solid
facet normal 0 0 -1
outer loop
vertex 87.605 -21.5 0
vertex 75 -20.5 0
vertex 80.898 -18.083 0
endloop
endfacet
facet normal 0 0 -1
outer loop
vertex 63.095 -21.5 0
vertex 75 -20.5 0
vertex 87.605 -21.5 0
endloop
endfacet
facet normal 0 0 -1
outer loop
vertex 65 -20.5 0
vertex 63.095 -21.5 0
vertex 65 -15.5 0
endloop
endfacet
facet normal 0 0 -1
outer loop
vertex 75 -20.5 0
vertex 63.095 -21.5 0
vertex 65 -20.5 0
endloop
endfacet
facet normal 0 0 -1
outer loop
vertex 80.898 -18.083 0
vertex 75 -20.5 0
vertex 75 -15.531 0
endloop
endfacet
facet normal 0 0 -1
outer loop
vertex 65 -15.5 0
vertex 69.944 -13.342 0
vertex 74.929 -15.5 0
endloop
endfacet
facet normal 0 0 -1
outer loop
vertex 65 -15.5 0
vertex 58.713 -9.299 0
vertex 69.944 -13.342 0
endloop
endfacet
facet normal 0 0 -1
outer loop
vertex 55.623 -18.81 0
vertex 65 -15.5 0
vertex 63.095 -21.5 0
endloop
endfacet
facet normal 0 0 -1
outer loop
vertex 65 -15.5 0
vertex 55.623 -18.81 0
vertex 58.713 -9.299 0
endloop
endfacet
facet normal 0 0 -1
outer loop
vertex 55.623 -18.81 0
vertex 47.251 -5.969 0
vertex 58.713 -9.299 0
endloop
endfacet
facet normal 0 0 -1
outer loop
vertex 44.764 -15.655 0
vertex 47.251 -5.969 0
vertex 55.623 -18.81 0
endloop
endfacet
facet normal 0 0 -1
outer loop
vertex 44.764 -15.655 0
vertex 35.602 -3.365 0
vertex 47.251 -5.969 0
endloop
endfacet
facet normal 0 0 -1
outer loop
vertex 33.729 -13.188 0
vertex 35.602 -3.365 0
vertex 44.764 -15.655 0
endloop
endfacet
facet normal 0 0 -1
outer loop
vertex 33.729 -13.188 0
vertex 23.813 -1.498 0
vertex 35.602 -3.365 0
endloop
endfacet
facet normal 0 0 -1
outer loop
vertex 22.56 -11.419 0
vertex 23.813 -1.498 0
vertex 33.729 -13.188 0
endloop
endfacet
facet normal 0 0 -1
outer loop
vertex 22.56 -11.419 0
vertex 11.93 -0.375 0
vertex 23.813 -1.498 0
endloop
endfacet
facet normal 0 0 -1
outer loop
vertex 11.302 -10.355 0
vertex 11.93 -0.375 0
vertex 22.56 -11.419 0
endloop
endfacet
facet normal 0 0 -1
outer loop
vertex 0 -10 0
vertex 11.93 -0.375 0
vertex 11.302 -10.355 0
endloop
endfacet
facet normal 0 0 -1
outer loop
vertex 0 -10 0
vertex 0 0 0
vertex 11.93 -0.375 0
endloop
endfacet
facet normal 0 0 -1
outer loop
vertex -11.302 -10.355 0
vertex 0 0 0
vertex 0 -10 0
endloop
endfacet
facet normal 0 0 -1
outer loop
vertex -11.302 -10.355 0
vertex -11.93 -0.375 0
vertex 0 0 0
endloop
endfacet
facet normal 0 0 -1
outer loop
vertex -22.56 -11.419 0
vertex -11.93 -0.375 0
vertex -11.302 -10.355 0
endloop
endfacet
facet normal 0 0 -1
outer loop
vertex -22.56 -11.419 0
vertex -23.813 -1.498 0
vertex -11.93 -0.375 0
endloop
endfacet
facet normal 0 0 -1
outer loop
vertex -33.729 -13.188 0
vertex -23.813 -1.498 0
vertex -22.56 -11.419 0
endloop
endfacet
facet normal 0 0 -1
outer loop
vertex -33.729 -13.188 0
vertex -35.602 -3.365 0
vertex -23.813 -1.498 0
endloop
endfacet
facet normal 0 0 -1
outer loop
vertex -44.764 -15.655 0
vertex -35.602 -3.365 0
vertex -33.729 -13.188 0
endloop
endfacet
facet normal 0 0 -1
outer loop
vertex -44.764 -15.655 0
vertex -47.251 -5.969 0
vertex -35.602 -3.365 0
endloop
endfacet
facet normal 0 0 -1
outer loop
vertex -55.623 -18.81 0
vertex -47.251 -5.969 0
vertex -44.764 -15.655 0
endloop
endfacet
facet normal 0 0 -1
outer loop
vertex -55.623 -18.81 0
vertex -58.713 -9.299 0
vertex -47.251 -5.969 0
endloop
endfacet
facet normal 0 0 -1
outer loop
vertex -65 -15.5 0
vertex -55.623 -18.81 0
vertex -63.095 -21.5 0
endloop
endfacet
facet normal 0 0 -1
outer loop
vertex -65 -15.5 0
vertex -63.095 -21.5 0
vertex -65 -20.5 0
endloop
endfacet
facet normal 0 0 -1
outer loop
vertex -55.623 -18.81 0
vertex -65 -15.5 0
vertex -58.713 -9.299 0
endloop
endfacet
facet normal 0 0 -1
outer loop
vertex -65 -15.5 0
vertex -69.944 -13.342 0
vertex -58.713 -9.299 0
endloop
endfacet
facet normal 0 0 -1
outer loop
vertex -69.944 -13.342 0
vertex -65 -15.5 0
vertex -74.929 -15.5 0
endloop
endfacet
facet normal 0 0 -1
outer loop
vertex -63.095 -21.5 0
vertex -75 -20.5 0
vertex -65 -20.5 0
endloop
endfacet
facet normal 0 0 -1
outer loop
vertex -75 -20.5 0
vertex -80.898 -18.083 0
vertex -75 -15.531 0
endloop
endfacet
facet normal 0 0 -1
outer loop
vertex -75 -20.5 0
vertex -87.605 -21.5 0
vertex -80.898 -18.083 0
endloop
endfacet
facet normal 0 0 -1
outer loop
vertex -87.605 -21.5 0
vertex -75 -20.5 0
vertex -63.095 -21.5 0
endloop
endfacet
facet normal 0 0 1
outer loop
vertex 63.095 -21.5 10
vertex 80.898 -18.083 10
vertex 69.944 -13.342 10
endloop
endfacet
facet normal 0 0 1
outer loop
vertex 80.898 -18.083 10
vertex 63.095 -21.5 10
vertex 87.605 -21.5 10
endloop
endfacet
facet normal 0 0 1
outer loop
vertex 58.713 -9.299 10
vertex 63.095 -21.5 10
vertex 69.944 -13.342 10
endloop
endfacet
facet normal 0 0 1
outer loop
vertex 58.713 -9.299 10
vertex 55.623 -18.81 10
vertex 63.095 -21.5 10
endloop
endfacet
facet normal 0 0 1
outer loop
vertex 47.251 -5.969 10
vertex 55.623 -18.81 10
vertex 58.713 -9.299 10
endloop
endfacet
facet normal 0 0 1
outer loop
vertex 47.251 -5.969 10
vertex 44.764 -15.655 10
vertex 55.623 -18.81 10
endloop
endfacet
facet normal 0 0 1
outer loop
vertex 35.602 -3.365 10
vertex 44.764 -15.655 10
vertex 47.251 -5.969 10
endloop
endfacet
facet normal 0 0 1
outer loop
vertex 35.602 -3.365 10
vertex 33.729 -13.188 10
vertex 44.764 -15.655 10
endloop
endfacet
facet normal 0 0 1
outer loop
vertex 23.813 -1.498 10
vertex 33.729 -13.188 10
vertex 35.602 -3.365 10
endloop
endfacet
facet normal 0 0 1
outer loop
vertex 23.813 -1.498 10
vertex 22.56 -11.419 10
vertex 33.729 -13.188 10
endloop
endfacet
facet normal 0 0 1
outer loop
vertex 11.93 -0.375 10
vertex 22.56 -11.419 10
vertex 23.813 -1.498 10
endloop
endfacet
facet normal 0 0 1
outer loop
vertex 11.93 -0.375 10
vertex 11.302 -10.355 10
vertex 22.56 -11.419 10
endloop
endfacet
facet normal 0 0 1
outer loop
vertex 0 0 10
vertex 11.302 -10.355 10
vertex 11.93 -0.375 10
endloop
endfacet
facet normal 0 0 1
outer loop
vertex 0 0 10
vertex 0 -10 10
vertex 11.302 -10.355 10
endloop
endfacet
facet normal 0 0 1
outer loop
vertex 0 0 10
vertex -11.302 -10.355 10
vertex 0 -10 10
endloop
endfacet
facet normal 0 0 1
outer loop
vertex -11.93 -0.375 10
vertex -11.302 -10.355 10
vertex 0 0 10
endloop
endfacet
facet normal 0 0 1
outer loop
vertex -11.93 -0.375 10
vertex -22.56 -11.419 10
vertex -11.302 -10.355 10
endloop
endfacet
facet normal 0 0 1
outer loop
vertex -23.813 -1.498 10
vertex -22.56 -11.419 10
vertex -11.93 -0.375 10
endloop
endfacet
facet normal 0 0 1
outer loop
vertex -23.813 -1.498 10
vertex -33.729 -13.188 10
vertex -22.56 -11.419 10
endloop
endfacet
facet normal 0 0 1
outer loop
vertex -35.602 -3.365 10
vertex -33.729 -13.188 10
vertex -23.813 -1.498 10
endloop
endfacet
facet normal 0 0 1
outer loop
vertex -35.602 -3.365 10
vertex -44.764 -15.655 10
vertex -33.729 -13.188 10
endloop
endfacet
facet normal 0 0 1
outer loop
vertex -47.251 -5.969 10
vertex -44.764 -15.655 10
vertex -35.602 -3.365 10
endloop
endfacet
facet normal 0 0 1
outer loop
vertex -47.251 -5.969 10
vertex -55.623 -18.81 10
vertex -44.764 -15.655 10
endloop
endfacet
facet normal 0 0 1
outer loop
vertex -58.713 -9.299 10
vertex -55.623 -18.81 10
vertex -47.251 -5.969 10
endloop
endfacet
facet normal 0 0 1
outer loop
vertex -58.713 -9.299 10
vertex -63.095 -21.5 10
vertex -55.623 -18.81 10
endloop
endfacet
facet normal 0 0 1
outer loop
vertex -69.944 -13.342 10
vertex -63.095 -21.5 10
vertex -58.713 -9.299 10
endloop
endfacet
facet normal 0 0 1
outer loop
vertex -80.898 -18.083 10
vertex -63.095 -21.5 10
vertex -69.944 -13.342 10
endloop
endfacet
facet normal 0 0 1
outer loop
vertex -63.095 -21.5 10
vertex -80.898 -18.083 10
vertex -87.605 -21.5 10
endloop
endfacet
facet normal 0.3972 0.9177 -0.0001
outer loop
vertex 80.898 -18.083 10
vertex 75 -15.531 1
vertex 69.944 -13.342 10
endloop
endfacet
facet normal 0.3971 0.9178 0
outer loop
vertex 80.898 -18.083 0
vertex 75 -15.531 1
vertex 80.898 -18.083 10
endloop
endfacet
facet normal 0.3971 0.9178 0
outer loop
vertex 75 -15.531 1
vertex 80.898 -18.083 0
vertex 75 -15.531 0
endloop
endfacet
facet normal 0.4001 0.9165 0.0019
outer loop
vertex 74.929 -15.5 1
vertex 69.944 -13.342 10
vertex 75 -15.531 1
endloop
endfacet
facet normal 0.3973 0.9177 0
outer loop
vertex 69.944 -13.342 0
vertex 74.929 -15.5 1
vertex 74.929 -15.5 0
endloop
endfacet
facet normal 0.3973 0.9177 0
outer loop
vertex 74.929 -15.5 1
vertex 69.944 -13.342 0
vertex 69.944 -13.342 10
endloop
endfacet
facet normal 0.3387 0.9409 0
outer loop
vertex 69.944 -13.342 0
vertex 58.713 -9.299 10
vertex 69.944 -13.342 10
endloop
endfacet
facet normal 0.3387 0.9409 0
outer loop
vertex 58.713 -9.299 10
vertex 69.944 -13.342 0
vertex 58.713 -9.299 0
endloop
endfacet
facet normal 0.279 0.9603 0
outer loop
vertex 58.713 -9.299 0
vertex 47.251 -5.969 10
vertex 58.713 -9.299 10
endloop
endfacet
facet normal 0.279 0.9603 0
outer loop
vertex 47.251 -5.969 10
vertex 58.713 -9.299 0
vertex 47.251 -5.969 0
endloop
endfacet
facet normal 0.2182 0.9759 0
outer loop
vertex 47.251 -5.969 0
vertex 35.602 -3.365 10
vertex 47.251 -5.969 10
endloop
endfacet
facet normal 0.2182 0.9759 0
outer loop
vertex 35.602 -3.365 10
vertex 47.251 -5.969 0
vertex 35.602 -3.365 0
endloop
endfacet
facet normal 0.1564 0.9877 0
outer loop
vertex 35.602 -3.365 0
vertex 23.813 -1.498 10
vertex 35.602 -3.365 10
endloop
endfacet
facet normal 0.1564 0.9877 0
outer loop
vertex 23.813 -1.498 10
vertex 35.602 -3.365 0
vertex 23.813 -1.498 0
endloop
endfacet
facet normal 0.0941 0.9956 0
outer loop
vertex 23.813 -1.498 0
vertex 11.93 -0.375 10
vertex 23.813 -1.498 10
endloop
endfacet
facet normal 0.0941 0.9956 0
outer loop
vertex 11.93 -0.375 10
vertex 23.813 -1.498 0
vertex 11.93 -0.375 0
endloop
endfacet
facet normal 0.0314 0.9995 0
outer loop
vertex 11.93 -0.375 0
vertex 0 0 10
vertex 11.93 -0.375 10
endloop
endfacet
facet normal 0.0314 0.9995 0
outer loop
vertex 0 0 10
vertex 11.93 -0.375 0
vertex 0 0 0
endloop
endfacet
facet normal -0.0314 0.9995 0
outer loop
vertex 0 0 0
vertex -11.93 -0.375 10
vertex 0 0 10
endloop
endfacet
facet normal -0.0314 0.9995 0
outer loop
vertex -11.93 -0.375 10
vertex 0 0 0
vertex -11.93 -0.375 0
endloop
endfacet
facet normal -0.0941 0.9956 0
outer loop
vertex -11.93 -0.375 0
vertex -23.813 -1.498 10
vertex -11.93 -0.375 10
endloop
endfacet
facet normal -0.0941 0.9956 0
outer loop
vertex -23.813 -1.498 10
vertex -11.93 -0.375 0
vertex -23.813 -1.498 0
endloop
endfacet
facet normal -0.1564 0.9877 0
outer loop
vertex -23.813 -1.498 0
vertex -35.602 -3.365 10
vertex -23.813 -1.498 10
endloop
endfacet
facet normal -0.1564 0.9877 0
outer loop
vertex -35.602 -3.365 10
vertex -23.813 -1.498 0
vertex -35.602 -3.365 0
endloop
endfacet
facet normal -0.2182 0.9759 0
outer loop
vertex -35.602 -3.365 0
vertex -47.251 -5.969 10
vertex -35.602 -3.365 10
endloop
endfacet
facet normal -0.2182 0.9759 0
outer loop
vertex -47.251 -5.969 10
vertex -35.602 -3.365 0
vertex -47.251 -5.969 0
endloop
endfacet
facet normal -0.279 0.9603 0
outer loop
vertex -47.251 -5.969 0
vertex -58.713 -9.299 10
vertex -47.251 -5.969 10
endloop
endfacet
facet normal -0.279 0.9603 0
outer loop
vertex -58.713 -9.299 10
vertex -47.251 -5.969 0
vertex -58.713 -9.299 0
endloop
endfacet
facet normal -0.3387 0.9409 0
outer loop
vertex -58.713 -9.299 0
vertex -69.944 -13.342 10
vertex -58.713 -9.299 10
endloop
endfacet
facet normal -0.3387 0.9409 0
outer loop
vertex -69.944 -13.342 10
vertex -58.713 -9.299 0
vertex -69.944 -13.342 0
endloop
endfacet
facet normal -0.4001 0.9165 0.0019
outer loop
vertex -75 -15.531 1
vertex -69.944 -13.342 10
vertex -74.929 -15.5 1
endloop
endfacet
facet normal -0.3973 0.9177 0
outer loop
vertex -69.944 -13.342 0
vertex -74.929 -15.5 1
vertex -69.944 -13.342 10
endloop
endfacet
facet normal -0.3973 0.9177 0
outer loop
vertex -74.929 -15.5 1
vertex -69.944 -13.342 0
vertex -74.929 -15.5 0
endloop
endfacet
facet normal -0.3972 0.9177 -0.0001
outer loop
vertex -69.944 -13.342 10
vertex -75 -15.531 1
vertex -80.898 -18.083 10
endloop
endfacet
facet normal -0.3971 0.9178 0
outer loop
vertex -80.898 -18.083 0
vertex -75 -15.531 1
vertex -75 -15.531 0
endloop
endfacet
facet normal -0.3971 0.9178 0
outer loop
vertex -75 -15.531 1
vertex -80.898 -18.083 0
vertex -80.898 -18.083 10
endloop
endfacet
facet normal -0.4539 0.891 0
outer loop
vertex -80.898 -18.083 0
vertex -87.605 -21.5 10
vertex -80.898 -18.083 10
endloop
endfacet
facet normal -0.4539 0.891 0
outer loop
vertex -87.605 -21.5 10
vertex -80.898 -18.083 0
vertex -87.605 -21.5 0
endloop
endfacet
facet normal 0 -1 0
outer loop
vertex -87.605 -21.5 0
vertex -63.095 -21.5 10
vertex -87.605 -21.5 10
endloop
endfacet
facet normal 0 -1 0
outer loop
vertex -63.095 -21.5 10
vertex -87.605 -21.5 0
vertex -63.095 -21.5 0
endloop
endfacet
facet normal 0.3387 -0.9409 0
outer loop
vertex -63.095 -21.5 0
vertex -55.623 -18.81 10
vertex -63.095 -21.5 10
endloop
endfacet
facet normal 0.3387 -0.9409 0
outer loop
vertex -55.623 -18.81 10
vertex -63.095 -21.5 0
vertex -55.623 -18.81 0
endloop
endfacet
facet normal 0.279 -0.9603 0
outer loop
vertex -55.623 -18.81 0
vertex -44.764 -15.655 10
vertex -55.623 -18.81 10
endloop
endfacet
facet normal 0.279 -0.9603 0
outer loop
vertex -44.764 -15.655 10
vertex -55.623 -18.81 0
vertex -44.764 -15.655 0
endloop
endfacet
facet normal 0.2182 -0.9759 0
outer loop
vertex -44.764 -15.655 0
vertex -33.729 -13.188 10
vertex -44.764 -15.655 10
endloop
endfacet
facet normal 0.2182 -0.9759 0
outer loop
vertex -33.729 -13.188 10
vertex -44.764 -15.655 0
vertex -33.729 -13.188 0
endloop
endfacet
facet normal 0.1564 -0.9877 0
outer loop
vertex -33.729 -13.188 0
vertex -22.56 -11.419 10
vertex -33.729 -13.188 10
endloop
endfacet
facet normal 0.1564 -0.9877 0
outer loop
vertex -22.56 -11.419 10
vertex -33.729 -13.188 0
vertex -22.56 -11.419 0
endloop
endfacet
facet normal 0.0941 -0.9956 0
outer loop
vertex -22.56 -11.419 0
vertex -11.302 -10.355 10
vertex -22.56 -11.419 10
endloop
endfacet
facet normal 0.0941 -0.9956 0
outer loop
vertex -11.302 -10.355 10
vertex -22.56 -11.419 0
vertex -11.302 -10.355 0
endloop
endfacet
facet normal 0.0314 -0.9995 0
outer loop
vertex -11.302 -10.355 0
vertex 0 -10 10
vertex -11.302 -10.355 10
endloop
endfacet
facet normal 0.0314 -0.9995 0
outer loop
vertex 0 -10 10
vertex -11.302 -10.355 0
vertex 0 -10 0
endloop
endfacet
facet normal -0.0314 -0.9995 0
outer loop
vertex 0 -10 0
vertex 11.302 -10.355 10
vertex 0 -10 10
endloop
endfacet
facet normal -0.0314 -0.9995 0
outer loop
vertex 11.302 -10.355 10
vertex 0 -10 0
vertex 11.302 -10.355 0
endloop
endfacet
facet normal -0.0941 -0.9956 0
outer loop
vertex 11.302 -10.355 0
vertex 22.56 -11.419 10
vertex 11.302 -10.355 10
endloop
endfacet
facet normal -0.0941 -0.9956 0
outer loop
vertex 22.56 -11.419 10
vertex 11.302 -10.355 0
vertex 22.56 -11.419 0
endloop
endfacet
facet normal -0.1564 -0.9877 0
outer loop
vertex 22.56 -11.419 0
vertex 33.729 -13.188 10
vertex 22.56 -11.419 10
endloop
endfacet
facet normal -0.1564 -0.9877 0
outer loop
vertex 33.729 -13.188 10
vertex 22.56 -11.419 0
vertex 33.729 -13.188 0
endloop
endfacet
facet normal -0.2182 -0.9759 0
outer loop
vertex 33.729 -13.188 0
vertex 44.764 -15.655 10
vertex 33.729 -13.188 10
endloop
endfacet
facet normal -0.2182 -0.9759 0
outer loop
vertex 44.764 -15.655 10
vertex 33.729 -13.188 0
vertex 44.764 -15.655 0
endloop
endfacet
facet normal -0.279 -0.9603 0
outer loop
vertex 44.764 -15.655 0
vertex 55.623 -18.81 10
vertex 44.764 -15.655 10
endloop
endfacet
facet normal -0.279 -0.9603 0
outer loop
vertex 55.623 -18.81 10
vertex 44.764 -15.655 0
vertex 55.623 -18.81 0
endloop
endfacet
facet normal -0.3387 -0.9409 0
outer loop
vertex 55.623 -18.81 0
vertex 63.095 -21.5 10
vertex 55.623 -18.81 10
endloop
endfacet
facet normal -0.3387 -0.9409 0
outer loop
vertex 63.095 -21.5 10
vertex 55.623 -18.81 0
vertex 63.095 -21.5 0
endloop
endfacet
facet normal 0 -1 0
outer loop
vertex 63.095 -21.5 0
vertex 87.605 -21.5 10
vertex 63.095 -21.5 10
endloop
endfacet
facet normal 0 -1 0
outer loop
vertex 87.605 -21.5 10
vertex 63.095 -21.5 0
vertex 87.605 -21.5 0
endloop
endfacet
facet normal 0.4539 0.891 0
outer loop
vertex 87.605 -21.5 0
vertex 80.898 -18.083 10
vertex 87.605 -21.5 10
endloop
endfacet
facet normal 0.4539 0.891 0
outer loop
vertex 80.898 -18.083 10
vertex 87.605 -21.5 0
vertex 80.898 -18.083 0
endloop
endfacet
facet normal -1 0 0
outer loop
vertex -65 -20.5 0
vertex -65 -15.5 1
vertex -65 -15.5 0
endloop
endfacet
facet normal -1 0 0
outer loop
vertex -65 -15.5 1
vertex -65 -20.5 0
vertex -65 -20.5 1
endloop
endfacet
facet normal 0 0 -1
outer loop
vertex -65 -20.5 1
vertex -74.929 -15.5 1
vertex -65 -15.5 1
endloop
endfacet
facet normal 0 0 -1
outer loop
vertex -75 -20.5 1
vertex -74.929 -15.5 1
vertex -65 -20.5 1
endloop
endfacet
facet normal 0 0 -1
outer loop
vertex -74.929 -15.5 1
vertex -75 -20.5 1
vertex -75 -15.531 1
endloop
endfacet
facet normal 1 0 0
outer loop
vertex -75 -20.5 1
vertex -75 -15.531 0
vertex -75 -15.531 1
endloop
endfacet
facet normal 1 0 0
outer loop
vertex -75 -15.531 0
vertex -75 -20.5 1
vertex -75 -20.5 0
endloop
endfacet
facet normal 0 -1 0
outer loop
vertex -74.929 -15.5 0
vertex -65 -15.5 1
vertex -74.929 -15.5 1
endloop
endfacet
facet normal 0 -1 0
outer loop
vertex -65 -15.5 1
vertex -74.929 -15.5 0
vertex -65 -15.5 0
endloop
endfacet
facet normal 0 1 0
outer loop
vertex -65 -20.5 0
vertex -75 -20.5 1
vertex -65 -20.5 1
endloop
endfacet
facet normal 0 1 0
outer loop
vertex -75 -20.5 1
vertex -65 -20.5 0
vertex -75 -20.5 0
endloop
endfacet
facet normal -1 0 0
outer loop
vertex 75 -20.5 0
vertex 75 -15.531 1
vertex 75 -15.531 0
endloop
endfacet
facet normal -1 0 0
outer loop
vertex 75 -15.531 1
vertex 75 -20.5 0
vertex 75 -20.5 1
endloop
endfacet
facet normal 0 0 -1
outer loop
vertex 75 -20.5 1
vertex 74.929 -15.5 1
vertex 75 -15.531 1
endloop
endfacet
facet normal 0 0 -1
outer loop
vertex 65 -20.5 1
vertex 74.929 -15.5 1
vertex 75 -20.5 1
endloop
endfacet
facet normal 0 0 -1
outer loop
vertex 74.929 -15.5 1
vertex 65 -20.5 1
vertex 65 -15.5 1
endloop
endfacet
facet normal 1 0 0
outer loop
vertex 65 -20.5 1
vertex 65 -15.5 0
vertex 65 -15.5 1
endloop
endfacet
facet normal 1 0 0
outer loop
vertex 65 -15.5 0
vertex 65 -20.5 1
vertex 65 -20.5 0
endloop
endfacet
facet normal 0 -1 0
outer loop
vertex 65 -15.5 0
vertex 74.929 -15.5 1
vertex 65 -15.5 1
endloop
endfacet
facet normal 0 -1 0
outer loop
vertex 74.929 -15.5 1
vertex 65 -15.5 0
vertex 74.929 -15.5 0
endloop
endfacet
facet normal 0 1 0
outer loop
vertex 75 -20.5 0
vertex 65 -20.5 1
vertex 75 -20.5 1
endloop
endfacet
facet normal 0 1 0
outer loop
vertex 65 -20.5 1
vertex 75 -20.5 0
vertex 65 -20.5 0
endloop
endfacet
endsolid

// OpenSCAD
// Kopfhoerer on/off
//
w=380;
du=20;

module bogen() {
    translate([0,-w/2])
    difference() {
        circle(d=w,$fn=100);
        translate([0,0,0])
        circle(d=w-du,$fn=100);
        translate([0,-22,0])
        square([w+1,w+1], center=true);
    }
}

difference() {
    linear_extrude(10)
    bogen();
    translate([-70,-18,0])
    cube([10,5,2],center=true);
    translate([70,-18,0])
    cube([10,5,2],center=true);
}
